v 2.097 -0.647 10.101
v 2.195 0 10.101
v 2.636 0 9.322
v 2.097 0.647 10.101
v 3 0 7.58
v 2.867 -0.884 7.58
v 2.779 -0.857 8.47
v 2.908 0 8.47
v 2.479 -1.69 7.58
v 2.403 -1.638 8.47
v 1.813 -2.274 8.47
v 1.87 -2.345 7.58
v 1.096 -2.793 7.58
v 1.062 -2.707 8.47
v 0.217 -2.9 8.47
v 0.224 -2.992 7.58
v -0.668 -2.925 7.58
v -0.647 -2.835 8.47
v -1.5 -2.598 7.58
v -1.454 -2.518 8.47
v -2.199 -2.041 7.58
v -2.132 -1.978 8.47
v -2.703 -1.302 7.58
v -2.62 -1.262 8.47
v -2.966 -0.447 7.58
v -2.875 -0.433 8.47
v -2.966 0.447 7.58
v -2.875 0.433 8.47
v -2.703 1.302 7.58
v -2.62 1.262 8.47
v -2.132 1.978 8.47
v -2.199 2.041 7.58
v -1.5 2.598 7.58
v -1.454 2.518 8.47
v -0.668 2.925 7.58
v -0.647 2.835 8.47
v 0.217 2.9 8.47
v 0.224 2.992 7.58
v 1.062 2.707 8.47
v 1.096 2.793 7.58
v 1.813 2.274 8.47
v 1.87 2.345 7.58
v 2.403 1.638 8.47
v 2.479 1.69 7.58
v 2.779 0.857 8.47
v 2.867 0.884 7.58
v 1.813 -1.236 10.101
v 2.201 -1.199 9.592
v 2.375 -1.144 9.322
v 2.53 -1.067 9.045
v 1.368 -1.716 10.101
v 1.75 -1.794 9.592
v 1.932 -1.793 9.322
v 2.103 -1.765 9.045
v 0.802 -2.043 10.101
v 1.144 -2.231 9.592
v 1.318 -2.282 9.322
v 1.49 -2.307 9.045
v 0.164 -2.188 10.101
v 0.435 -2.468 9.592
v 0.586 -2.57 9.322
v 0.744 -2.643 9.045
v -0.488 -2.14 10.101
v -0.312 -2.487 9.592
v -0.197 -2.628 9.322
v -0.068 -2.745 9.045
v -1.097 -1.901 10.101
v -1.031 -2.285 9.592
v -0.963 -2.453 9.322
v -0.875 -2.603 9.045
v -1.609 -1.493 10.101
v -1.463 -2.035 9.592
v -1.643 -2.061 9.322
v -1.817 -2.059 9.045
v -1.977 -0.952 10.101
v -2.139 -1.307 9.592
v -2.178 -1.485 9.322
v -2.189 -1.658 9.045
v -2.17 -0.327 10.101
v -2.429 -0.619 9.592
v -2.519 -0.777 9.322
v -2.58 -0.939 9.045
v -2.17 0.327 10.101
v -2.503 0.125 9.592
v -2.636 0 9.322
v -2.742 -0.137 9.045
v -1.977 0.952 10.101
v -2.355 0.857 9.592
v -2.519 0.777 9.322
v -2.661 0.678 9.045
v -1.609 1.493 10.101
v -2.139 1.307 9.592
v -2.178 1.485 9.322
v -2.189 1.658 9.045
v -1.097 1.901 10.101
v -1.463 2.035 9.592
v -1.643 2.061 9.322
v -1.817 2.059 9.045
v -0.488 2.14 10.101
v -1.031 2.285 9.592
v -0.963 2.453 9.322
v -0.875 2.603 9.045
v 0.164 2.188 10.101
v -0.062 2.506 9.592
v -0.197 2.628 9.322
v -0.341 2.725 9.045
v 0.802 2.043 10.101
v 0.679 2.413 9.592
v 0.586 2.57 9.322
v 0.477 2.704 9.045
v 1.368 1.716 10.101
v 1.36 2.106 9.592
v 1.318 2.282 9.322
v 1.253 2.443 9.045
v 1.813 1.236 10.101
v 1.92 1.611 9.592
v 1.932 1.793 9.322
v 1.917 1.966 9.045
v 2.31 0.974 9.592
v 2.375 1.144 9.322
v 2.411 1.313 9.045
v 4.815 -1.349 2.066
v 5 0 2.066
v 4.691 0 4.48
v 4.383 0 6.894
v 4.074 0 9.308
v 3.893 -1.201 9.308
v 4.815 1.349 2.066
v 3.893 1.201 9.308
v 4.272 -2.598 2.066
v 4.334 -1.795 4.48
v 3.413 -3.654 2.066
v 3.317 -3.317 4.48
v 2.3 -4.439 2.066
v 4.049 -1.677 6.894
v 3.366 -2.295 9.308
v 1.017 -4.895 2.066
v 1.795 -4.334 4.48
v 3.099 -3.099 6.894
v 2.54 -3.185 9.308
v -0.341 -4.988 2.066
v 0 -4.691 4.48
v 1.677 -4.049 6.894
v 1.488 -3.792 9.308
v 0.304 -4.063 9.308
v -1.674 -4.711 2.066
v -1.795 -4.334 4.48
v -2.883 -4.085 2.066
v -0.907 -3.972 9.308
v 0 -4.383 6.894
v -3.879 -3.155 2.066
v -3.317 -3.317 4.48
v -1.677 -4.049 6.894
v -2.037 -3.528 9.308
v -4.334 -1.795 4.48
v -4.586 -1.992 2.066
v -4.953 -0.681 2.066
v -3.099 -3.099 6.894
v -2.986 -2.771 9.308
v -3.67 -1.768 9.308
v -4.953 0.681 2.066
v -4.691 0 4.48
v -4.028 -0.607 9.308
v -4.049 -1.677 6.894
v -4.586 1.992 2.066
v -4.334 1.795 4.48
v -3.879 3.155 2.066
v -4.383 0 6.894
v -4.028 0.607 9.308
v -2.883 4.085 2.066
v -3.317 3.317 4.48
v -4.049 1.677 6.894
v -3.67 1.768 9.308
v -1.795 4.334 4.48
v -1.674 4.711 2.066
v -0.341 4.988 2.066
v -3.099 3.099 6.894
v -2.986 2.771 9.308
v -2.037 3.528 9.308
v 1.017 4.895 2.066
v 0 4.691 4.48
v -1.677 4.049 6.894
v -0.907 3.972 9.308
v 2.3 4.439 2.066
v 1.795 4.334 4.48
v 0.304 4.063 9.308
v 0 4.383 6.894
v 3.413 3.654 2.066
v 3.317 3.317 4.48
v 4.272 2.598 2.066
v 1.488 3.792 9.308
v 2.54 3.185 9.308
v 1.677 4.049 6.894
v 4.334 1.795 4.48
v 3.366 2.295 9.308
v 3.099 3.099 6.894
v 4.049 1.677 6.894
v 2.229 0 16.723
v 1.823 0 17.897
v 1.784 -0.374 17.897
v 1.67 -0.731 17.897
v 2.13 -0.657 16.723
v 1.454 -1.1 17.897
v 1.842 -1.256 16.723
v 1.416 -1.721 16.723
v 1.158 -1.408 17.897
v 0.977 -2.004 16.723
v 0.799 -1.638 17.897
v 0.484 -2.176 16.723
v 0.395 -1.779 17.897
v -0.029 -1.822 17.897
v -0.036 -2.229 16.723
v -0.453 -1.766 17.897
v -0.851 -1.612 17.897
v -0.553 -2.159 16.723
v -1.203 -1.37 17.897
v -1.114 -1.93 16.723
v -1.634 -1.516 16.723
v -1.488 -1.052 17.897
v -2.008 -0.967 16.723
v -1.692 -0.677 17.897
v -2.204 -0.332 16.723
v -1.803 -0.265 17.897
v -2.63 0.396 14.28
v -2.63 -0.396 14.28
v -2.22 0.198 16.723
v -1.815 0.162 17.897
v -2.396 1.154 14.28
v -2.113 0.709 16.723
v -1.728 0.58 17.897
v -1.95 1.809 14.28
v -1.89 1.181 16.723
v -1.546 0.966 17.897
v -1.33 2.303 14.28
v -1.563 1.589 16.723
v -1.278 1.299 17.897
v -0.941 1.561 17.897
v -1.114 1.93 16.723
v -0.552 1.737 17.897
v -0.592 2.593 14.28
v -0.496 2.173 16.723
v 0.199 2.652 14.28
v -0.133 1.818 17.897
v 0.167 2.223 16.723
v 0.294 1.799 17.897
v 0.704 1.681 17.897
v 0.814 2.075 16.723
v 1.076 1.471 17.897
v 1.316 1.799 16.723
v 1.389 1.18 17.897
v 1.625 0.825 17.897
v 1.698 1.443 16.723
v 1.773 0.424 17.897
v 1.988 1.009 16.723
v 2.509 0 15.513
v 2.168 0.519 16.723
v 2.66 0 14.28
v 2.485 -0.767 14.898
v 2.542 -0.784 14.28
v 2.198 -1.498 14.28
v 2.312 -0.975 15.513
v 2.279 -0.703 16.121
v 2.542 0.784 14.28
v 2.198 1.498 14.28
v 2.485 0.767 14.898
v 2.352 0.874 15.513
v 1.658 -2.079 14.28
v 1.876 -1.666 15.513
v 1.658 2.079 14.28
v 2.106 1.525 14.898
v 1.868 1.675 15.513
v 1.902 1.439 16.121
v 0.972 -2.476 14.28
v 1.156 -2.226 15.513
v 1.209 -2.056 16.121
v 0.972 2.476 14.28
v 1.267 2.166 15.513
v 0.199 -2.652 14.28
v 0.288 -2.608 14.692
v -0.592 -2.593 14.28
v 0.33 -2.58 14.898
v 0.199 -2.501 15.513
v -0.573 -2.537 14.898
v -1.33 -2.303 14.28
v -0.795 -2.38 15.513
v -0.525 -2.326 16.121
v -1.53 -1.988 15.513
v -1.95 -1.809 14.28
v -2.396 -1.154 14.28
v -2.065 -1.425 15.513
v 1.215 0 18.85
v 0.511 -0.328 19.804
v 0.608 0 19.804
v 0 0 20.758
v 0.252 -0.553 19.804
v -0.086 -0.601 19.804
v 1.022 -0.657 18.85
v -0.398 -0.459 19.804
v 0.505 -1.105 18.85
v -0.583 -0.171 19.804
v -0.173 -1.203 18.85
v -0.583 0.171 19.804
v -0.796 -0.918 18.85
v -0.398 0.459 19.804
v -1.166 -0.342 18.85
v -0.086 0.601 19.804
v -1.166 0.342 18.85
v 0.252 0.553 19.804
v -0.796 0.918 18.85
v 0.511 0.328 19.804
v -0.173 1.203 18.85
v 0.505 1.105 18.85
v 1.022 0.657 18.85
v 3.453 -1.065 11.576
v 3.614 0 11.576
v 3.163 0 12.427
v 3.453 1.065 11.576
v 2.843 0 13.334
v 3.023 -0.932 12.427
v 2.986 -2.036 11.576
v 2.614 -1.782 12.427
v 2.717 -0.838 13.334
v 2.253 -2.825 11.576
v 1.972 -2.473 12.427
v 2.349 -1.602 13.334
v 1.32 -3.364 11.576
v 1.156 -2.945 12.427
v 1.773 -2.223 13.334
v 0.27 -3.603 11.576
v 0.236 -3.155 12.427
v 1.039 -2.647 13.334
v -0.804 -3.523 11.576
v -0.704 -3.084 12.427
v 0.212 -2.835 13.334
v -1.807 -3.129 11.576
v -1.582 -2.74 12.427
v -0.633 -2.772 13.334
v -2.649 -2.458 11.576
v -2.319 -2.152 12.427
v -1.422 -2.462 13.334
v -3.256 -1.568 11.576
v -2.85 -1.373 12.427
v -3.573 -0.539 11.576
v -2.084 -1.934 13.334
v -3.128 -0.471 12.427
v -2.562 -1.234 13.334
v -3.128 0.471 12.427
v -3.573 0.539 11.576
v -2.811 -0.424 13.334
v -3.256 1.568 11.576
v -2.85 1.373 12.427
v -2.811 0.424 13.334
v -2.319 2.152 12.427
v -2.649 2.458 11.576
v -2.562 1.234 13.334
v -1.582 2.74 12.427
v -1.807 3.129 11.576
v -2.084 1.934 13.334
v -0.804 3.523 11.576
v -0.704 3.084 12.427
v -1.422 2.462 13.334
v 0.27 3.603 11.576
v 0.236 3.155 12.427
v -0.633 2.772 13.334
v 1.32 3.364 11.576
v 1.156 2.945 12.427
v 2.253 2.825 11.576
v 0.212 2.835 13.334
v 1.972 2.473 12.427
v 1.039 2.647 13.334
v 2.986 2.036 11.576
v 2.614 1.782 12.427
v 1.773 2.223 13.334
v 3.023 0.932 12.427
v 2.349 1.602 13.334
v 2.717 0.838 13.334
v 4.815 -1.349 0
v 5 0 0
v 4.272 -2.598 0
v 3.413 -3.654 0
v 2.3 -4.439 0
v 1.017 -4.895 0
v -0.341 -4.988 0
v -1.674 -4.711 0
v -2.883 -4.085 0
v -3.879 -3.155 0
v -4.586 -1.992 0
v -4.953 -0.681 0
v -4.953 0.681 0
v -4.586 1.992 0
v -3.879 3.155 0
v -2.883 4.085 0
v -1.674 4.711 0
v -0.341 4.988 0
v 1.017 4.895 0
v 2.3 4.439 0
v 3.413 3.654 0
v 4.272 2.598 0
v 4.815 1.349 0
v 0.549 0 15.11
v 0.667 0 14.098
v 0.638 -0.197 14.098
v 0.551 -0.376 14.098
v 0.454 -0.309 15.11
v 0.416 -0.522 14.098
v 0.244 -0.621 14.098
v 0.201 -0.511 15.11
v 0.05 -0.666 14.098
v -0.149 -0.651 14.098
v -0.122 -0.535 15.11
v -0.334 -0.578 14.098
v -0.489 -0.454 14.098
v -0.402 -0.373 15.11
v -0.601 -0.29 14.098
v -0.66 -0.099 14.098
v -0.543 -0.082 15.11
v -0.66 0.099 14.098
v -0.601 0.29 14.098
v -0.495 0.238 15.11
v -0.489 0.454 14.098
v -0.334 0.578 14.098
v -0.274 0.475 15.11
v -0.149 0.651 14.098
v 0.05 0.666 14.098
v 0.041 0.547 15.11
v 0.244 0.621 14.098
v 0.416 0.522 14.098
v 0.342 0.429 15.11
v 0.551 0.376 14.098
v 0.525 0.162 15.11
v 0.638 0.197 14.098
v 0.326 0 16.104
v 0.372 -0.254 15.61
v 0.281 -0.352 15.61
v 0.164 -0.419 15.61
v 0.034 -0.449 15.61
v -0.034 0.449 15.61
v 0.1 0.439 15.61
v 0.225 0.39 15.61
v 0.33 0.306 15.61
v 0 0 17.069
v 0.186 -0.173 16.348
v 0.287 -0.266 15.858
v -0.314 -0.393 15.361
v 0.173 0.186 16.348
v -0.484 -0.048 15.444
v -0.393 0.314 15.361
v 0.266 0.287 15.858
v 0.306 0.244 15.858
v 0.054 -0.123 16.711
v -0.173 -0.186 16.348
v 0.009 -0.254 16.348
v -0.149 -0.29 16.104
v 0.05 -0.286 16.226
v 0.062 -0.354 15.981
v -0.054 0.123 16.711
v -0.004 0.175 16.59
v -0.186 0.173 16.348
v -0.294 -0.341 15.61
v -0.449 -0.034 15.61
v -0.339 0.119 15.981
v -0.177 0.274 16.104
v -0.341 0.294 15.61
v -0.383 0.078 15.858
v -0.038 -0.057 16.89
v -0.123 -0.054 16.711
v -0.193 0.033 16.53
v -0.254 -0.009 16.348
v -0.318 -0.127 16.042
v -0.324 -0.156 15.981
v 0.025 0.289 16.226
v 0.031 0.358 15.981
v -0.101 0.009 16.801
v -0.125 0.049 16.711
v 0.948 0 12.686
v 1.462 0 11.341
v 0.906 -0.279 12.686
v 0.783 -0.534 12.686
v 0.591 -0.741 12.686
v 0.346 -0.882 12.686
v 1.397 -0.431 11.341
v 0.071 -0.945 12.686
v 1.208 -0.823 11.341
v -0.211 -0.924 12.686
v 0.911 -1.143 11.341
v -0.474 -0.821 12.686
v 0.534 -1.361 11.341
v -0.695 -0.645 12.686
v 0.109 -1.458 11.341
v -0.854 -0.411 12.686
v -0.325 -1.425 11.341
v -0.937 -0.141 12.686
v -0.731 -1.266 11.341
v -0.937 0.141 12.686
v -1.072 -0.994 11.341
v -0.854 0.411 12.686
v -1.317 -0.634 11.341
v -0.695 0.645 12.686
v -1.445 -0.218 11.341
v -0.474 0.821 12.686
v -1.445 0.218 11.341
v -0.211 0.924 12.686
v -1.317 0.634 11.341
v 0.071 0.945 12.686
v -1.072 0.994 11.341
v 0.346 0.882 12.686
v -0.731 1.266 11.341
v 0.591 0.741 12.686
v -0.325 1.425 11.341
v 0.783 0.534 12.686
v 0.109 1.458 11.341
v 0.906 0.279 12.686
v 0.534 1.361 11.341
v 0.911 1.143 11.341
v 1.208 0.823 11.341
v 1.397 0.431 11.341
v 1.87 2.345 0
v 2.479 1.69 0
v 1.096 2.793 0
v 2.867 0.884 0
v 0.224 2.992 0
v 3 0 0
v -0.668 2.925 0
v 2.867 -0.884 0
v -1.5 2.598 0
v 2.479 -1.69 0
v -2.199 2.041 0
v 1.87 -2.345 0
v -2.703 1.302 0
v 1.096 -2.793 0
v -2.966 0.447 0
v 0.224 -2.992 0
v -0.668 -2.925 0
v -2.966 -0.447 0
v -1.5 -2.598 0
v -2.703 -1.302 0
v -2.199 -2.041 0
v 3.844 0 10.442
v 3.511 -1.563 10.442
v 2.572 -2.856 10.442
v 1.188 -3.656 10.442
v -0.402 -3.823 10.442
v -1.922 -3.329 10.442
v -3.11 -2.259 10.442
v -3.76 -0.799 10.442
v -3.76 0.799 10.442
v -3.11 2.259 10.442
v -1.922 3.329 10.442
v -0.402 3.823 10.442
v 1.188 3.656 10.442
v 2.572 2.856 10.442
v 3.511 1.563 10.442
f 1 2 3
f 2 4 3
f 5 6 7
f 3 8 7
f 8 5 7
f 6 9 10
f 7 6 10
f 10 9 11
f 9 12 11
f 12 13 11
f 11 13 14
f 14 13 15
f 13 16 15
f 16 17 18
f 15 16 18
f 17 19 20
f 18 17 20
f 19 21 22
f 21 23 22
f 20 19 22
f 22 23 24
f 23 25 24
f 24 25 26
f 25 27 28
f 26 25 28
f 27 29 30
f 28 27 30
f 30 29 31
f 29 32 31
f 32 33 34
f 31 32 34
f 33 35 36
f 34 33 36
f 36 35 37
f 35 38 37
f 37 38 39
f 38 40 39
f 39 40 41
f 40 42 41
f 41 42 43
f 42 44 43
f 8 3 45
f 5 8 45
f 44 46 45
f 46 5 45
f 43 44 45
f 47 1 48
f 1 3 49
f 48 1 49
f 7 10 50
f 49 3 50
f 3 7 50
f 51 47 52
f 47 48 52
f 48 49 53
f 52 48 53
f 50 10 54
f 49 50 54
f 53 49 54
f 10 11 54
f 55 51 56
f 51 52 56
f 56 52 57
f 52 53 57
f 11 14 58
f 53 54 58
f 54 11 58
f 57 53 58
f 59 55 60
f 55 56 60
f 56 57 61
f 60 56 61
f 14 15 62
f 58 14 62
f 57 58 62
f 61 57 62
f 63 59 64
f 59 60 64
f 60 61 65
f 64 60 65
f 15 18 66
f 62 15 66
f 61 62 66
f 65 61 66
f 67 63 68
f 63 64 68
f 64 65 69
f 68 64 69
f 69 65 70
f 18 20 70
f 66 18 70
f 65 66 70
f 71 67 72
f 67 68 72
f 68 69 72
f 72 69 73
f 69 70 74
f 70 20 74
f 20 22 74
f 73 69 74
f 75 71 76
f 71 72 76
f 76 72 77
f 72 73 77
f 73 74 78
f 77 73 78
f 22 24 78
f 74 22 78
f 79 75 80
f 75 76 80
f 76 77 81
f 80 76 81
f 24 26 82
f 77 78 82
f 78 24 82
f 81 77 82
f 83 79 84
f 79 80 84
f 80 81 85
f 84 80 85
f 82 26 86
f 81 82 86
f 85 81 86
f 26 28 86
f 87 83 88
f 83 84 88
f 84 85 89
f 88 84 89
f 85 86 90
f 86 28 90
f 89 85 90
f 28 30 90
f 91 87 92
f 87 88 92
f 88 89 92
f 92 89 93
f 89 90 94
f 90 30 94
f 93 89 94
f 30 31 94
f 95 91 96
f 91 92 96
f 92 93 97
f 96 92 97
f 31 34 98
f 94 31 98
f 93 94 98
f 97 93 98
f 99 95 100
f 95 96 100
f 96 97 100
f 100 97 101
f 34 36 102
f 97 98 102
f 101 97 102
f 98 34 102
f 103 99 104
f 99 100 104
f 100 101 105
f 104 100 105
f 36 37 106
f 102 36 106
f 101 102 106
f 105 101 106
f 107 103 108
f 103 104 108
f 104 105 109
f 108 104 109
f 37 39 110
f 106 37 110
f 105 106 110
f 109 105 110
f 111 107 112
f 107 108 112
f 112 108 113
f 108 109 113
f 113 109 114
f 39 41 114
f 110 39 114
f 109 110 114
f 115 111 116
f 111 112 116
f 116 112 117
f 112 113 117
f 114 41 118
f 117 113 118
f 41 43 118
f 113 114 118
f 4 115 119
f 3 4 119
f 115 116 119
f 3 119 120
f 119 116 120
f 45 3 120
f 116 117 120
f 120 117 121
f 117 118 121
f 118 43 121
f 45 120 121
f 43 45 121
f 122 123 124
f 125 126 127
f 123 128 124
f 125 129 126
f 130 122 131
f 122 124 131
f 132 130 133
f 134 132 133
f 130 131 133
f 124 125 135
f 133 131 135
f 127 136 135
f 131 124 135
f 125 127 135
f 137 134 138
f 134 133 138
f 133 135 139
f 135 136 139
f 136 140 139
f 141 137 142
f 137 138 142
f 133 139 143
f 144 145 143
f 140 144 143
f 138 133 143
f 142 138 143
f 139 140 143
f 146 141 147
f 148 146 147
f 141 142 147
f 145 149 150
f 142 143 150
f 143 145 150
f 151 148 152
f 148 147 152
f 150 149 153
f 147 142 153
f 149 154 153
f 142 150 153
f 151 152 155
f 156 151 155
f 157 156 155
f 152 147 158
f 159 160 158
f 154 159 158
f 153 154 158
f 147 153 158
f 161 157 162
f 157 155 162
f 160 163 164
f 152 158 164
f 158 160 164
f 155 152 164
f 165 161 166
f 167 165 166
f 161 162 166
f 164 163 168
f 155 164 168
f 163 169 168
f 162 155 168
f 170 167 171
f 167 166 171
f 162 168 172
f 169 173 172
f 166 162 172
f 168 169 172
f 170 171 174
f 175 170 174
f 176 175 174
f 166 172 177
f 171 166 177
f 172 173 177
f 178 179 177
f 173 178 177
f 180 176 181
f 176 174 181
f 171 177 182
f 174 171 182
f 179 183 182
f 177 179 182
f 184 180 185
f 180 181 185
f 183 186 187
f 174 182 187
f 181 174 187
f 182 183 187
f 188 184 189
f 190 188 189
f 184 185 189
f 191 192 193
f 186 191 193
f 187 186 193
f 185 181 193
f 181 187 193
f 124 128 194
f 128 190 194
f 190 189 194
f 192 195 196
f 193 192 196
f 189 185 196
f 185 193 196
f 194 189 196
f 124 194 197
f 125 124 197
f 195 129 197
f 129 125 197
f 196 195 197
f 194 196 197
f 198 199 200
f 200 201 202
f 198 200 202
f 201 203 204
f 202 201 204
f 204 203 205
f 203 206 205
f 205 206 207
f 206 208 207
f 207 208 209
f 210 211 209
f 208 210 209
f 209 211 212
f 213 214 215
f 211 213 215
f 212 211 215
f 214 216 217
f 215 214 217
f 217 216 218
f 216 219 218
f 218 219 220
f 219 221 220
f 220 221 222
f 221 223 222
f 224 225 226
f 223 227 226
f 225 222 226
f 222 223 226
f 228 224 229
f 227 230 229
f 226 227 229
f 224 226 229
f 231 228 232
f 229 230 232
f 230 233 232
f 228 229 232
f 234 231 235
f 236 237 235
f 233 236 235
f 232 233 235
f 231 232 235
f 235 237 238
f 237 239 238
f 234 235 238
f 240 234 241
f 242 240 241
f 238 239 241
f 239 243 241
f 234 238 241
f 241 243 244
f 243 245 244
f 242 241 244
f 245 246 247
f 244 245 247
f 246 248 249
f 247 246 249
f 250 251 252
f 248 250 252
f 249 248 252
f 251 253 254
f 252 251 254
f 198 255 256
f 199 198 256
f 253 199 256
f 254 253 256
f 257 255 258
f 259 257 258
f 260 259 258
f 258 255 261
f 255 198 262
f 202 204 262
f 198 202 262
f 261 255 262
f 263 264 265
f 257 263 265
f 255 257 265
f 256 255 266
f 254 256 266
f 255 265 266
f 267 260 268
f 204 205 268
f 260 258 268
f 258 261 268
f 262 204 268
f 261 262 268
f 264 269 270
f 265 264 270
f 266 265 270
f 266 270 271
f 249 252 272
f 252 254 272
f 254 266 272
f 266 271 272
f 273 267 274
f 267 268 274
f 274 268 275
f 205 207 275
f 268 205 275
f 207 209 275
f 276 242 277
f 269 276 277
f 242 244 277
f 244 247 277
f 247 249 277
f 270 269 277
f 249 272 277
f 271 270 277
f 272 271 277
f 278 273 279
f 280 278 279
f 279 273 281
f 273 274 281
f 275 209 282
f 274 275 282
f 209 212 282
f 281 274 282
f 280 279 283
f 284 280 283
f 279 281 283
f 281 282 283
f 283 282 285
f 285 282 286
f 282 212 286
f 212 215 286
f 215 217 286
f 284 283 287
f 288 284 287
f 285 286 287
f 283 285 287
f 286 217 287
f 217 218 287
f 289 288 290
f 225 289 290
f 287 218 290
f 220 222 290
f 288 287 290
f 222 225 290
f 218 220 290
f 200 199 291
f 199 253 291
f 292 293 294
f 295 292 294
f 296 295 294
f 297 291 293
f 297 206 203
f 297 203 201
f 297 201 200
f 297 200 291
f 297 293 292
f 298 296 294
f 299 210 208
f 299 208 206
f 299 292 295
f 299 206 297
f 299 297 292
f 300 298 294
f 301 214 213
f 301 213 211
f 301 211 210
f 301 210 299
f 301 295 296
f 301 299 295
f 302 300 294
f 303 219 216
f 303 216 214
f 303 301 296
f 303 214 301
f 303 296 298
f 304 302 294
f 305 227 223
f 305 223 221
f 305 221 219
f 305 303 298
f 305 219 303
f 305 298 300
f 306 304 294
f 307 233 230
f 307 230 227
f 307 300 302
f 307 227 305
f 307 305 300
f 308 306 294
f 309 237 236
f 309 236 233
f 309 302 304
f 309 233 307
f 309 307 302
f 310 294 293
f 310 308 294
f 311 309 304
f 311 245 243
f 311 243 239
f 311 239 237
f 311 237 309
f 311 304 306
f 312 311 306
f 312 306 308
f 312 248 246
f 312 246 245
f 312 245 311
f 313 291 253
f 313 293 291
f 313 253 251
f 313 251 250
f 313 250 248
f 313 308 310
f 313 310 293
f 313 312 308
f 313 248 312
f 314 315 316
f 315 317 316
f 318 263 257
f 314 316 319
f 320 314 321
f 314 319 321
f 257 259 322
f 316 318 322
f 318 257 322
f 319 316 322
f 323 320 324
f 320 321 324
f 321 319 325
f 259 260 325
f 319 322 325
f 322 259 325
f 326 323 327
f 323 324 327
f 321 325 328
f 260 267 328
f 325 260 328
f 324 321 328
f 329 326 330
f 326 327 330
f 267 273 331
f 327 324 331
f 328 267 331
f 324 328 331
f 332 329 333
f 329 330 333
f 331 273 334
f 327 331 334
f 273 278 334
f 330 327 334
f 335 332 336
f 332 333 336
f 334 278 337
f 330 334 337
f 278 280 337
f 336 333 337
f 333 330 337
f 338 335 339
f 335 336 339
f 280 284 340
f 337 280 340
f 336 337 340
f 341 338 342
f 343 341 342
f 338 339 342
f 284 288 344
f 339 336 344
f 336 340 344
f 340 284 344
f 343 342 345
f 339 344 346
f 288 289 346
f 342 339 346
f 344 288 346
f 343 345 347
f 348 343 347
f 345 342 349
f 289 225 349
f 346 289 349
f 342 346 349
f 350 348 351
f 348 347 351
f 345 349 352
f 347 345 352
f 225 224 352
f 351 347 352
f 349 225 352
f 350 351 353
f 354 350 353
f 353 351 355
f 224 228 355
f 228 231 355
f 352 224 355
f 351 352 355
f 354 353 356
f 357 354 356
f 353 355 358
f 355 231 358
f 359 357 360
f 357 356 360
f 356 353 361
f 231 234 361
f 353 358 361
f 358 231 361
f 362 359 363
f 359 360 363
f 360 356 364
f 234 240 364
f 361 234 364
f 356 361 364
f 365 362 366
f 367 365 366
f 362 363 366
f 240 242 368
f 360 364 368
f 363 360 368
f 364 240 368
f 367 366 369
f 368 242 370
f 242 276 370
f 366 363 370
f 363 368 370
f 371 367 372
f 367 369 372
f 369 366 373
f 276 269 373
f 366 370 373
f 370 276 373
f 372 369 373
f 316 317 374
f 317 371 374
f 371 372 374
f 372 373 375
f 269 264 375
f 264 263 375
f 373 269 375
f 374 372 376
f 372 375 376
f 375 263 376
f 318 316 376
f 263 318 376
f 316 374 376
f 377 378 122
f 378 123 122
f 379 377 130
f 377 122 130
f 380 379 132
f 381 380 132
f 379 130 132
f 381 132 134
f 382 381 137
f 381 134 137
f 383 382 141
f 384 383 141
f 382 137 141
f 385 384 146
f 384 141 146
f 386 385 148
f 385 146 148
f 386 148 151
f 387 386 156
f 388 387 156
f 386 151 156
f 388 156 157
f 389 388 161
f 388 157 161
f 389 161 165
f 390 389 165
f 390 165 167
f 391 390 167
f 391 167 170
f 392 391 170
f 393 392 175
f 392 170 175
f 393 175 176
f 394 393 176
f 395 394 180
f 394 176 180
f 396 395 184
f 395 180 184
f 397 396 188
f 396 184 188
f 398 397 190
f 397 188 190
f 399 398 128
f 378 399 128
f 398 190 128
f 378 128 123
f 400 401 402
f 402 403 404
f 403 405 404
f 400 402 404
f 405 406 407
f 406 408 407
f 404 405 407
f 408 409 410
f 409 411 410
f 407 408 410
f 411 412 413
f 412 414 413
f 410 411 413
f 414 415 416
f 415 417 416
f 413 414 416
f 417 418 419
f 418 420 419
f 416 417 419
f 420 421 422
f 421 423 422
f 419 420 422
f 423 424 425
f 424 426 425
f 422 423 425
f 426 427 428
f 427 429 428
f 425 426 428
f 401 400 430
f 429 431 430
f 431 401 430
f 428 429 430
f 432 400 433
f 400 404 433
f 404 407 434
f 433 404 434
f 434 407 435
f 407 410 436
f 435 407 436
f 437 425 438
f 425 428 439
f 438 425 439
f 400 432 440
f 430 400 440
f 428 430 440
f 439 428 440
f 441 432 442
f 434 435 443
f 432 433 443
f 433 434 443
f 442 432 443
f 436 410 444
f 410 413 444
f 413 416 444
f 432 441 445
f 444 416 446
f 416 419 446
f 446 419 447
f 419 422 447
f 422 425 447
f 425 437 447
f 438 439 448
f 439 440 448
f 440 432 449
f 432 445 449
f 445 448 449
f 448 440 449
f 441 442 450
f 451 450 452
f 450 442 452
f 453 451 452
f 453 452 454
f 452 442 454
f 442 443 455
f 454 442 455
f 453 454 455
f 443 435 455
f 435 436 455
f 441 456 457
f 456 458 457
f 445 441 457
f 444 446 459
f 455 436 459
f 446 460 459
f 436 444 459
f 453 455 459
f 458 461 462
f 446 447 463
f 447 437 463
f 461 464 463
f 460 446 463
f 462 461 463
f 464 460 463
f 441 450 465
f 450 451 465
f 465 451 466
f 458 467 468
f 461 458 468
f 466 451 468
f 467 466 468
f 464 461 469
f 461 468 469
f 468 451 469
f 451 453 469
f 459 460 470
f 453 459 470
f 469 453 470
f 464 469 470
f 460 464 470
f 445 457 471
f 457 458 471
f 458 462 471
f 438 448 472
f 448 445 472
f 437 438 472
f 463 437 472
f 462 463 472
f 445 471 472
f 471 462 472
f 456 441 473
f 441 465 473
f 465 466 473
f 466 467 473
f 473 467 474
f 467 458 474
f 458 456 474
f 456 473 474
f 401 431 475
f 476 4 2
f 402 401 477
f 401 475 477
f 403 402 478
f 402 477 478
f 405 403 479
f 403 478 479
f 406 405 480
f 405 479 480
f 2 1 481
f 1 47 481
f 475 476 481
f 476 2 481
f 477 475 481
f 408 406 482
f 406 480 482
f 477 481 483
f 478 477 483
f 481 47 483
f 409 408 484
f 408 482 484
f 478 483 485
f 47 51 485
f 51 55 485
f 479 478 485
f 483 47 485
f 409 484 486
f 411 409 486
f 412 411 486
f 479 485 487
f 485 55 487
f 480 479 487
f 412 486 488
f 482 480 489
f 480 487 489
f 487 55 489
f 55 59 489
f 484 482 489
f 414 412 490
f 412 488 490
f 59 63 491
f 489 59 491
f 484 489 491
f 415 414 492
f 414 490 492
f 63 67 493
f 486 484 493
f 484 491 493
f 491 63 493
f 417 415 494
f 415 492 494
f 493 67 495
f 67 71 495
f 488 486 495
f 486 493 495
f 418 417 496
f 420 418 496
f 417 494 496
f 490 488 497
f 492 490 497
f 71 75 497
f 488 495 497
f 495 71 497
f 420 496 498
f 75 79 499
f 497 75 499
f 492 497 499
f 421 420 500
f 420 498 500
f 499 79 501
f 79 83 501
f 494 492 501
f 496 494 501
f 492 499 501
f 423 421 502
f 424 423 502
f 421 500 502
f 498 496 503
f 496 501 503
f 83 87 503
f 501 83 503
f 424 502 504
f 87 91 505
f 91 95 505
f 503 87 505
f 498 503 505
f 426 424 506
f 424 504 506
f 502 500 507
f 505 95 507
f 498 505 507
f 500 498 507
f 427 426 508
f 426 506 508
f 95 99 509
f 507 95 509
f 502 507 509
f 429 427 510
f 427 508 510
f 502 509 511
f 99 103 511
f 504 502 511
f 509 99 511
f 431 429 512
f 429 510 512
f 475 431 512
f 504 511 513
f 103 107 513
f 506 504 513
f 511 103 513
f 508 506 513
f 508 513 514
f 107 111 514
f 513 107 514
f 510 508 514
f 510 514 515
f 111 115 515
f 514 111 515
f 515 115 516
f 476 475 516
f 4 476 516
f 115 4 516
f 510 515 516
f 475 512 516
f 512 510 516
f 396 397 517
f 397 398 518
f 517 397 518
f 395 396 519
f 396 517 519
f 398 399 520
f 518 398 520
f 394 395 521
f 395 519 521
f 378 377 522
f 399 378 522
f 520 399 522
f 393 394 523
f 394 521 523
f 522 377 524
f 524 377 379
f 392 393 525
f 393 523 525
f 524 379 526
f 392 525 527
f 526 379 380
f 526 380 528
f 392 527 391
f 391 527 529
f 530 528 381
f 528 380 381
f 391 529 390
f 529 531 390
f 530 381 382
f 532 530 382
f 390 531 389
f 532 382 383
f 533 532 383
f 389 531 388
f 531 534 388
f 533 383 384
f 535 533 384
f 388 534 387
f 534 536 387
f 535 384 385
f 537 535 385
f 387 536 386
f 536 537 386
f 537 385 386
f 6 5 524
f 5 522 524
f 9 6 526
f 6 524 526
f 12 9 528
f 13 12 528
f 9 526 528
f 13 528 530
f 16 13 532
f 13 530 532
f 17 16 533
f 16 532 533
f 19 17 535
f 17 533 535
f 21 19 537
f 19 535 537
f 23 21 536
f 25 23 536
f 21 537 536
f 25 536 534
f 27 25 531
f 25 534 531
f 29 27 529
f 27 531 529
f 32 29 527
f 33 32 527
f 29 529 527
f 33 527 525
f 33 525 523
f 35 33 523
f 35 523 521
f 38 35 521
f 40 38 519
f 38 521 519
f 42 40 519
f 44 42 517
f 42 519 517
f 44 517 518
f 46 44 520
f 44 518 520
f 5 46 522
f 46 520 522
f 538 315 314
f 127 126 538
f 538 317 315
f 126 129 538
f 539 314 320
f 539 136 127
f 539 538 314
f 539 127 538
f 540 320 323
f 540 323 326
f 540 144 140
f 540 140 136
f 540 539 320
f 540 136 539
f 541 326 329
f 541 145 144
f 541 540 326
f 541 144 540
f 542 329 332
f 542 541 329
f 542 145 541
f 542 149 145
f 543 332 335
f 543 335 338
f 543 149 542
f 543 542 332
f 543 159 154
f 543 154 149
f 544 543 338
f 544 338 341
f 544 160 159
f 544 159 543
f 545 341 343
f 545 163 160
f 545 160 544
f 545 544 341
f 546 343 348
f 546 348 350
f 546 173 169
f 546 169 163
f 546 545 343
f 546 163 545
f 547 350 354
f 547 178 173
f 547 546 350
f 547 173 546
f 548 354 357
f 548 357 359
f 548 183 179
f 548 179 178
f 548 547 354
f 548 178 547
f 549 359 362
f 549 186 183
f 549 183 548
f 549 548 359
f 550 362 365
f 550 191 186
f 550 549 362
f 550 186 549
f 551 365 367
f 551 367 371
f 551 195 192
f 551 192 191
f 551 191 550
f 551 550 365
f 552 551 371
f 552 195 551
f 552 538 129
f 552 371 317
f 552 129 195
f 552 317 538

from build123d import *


with BuildPart() as f1:
    # F0 (on Front) → F1 (revolve)
    with BuildSketch(Plane.XZ):
        with BuildLine():
            Line((3, 0), (5, 0))
            Line((5, 0), (5, 2.066073))
            Line((5, 2.066073), (3.824242, 11.260495))
            ThreePointArc((3.824242, 11.260495), (3.052163, 12.696792), (2.659773, 14.279537))
            ThreePointArc((2.659773, 14.279537), (1.851925, 17.824059), (0, 20.952418))
            Line((0, 20.952418), (0, 17.068623))
            ThreePointArc((0, 17.068623), (0.450236, 15.609737), (0.667413, 14.09848))
            ThreePointArc((0.667413, 14.09848), (1.176377, 12.002533), (2.194559, 10.101127))
            ThreePointArc((2.194559, 10.101127), (2.79375, 8.903069), (3, 7.579501))
            Line((3, 7.579501), (3, 0))
        make_face()
    revolve(axis=Axis((0, 0, 16.671413), (0, 0, -1)))

    # F2 (on Front) → F3 (revolve, cut)
    with BuildSketch(Plane.XZ):
        Polygon((9.900054, 13.367673), (0, 21.913905), (0, 20.757873), (3.29275, 15.589049), (3.29275, 13.155878), (5.5244, 2.163447), align=None)
    revolve(axis=Axis((0, 0, 21.335889), (0, 0, -1)), mode=Mode.SUBTRACT)


solid = f1.part
